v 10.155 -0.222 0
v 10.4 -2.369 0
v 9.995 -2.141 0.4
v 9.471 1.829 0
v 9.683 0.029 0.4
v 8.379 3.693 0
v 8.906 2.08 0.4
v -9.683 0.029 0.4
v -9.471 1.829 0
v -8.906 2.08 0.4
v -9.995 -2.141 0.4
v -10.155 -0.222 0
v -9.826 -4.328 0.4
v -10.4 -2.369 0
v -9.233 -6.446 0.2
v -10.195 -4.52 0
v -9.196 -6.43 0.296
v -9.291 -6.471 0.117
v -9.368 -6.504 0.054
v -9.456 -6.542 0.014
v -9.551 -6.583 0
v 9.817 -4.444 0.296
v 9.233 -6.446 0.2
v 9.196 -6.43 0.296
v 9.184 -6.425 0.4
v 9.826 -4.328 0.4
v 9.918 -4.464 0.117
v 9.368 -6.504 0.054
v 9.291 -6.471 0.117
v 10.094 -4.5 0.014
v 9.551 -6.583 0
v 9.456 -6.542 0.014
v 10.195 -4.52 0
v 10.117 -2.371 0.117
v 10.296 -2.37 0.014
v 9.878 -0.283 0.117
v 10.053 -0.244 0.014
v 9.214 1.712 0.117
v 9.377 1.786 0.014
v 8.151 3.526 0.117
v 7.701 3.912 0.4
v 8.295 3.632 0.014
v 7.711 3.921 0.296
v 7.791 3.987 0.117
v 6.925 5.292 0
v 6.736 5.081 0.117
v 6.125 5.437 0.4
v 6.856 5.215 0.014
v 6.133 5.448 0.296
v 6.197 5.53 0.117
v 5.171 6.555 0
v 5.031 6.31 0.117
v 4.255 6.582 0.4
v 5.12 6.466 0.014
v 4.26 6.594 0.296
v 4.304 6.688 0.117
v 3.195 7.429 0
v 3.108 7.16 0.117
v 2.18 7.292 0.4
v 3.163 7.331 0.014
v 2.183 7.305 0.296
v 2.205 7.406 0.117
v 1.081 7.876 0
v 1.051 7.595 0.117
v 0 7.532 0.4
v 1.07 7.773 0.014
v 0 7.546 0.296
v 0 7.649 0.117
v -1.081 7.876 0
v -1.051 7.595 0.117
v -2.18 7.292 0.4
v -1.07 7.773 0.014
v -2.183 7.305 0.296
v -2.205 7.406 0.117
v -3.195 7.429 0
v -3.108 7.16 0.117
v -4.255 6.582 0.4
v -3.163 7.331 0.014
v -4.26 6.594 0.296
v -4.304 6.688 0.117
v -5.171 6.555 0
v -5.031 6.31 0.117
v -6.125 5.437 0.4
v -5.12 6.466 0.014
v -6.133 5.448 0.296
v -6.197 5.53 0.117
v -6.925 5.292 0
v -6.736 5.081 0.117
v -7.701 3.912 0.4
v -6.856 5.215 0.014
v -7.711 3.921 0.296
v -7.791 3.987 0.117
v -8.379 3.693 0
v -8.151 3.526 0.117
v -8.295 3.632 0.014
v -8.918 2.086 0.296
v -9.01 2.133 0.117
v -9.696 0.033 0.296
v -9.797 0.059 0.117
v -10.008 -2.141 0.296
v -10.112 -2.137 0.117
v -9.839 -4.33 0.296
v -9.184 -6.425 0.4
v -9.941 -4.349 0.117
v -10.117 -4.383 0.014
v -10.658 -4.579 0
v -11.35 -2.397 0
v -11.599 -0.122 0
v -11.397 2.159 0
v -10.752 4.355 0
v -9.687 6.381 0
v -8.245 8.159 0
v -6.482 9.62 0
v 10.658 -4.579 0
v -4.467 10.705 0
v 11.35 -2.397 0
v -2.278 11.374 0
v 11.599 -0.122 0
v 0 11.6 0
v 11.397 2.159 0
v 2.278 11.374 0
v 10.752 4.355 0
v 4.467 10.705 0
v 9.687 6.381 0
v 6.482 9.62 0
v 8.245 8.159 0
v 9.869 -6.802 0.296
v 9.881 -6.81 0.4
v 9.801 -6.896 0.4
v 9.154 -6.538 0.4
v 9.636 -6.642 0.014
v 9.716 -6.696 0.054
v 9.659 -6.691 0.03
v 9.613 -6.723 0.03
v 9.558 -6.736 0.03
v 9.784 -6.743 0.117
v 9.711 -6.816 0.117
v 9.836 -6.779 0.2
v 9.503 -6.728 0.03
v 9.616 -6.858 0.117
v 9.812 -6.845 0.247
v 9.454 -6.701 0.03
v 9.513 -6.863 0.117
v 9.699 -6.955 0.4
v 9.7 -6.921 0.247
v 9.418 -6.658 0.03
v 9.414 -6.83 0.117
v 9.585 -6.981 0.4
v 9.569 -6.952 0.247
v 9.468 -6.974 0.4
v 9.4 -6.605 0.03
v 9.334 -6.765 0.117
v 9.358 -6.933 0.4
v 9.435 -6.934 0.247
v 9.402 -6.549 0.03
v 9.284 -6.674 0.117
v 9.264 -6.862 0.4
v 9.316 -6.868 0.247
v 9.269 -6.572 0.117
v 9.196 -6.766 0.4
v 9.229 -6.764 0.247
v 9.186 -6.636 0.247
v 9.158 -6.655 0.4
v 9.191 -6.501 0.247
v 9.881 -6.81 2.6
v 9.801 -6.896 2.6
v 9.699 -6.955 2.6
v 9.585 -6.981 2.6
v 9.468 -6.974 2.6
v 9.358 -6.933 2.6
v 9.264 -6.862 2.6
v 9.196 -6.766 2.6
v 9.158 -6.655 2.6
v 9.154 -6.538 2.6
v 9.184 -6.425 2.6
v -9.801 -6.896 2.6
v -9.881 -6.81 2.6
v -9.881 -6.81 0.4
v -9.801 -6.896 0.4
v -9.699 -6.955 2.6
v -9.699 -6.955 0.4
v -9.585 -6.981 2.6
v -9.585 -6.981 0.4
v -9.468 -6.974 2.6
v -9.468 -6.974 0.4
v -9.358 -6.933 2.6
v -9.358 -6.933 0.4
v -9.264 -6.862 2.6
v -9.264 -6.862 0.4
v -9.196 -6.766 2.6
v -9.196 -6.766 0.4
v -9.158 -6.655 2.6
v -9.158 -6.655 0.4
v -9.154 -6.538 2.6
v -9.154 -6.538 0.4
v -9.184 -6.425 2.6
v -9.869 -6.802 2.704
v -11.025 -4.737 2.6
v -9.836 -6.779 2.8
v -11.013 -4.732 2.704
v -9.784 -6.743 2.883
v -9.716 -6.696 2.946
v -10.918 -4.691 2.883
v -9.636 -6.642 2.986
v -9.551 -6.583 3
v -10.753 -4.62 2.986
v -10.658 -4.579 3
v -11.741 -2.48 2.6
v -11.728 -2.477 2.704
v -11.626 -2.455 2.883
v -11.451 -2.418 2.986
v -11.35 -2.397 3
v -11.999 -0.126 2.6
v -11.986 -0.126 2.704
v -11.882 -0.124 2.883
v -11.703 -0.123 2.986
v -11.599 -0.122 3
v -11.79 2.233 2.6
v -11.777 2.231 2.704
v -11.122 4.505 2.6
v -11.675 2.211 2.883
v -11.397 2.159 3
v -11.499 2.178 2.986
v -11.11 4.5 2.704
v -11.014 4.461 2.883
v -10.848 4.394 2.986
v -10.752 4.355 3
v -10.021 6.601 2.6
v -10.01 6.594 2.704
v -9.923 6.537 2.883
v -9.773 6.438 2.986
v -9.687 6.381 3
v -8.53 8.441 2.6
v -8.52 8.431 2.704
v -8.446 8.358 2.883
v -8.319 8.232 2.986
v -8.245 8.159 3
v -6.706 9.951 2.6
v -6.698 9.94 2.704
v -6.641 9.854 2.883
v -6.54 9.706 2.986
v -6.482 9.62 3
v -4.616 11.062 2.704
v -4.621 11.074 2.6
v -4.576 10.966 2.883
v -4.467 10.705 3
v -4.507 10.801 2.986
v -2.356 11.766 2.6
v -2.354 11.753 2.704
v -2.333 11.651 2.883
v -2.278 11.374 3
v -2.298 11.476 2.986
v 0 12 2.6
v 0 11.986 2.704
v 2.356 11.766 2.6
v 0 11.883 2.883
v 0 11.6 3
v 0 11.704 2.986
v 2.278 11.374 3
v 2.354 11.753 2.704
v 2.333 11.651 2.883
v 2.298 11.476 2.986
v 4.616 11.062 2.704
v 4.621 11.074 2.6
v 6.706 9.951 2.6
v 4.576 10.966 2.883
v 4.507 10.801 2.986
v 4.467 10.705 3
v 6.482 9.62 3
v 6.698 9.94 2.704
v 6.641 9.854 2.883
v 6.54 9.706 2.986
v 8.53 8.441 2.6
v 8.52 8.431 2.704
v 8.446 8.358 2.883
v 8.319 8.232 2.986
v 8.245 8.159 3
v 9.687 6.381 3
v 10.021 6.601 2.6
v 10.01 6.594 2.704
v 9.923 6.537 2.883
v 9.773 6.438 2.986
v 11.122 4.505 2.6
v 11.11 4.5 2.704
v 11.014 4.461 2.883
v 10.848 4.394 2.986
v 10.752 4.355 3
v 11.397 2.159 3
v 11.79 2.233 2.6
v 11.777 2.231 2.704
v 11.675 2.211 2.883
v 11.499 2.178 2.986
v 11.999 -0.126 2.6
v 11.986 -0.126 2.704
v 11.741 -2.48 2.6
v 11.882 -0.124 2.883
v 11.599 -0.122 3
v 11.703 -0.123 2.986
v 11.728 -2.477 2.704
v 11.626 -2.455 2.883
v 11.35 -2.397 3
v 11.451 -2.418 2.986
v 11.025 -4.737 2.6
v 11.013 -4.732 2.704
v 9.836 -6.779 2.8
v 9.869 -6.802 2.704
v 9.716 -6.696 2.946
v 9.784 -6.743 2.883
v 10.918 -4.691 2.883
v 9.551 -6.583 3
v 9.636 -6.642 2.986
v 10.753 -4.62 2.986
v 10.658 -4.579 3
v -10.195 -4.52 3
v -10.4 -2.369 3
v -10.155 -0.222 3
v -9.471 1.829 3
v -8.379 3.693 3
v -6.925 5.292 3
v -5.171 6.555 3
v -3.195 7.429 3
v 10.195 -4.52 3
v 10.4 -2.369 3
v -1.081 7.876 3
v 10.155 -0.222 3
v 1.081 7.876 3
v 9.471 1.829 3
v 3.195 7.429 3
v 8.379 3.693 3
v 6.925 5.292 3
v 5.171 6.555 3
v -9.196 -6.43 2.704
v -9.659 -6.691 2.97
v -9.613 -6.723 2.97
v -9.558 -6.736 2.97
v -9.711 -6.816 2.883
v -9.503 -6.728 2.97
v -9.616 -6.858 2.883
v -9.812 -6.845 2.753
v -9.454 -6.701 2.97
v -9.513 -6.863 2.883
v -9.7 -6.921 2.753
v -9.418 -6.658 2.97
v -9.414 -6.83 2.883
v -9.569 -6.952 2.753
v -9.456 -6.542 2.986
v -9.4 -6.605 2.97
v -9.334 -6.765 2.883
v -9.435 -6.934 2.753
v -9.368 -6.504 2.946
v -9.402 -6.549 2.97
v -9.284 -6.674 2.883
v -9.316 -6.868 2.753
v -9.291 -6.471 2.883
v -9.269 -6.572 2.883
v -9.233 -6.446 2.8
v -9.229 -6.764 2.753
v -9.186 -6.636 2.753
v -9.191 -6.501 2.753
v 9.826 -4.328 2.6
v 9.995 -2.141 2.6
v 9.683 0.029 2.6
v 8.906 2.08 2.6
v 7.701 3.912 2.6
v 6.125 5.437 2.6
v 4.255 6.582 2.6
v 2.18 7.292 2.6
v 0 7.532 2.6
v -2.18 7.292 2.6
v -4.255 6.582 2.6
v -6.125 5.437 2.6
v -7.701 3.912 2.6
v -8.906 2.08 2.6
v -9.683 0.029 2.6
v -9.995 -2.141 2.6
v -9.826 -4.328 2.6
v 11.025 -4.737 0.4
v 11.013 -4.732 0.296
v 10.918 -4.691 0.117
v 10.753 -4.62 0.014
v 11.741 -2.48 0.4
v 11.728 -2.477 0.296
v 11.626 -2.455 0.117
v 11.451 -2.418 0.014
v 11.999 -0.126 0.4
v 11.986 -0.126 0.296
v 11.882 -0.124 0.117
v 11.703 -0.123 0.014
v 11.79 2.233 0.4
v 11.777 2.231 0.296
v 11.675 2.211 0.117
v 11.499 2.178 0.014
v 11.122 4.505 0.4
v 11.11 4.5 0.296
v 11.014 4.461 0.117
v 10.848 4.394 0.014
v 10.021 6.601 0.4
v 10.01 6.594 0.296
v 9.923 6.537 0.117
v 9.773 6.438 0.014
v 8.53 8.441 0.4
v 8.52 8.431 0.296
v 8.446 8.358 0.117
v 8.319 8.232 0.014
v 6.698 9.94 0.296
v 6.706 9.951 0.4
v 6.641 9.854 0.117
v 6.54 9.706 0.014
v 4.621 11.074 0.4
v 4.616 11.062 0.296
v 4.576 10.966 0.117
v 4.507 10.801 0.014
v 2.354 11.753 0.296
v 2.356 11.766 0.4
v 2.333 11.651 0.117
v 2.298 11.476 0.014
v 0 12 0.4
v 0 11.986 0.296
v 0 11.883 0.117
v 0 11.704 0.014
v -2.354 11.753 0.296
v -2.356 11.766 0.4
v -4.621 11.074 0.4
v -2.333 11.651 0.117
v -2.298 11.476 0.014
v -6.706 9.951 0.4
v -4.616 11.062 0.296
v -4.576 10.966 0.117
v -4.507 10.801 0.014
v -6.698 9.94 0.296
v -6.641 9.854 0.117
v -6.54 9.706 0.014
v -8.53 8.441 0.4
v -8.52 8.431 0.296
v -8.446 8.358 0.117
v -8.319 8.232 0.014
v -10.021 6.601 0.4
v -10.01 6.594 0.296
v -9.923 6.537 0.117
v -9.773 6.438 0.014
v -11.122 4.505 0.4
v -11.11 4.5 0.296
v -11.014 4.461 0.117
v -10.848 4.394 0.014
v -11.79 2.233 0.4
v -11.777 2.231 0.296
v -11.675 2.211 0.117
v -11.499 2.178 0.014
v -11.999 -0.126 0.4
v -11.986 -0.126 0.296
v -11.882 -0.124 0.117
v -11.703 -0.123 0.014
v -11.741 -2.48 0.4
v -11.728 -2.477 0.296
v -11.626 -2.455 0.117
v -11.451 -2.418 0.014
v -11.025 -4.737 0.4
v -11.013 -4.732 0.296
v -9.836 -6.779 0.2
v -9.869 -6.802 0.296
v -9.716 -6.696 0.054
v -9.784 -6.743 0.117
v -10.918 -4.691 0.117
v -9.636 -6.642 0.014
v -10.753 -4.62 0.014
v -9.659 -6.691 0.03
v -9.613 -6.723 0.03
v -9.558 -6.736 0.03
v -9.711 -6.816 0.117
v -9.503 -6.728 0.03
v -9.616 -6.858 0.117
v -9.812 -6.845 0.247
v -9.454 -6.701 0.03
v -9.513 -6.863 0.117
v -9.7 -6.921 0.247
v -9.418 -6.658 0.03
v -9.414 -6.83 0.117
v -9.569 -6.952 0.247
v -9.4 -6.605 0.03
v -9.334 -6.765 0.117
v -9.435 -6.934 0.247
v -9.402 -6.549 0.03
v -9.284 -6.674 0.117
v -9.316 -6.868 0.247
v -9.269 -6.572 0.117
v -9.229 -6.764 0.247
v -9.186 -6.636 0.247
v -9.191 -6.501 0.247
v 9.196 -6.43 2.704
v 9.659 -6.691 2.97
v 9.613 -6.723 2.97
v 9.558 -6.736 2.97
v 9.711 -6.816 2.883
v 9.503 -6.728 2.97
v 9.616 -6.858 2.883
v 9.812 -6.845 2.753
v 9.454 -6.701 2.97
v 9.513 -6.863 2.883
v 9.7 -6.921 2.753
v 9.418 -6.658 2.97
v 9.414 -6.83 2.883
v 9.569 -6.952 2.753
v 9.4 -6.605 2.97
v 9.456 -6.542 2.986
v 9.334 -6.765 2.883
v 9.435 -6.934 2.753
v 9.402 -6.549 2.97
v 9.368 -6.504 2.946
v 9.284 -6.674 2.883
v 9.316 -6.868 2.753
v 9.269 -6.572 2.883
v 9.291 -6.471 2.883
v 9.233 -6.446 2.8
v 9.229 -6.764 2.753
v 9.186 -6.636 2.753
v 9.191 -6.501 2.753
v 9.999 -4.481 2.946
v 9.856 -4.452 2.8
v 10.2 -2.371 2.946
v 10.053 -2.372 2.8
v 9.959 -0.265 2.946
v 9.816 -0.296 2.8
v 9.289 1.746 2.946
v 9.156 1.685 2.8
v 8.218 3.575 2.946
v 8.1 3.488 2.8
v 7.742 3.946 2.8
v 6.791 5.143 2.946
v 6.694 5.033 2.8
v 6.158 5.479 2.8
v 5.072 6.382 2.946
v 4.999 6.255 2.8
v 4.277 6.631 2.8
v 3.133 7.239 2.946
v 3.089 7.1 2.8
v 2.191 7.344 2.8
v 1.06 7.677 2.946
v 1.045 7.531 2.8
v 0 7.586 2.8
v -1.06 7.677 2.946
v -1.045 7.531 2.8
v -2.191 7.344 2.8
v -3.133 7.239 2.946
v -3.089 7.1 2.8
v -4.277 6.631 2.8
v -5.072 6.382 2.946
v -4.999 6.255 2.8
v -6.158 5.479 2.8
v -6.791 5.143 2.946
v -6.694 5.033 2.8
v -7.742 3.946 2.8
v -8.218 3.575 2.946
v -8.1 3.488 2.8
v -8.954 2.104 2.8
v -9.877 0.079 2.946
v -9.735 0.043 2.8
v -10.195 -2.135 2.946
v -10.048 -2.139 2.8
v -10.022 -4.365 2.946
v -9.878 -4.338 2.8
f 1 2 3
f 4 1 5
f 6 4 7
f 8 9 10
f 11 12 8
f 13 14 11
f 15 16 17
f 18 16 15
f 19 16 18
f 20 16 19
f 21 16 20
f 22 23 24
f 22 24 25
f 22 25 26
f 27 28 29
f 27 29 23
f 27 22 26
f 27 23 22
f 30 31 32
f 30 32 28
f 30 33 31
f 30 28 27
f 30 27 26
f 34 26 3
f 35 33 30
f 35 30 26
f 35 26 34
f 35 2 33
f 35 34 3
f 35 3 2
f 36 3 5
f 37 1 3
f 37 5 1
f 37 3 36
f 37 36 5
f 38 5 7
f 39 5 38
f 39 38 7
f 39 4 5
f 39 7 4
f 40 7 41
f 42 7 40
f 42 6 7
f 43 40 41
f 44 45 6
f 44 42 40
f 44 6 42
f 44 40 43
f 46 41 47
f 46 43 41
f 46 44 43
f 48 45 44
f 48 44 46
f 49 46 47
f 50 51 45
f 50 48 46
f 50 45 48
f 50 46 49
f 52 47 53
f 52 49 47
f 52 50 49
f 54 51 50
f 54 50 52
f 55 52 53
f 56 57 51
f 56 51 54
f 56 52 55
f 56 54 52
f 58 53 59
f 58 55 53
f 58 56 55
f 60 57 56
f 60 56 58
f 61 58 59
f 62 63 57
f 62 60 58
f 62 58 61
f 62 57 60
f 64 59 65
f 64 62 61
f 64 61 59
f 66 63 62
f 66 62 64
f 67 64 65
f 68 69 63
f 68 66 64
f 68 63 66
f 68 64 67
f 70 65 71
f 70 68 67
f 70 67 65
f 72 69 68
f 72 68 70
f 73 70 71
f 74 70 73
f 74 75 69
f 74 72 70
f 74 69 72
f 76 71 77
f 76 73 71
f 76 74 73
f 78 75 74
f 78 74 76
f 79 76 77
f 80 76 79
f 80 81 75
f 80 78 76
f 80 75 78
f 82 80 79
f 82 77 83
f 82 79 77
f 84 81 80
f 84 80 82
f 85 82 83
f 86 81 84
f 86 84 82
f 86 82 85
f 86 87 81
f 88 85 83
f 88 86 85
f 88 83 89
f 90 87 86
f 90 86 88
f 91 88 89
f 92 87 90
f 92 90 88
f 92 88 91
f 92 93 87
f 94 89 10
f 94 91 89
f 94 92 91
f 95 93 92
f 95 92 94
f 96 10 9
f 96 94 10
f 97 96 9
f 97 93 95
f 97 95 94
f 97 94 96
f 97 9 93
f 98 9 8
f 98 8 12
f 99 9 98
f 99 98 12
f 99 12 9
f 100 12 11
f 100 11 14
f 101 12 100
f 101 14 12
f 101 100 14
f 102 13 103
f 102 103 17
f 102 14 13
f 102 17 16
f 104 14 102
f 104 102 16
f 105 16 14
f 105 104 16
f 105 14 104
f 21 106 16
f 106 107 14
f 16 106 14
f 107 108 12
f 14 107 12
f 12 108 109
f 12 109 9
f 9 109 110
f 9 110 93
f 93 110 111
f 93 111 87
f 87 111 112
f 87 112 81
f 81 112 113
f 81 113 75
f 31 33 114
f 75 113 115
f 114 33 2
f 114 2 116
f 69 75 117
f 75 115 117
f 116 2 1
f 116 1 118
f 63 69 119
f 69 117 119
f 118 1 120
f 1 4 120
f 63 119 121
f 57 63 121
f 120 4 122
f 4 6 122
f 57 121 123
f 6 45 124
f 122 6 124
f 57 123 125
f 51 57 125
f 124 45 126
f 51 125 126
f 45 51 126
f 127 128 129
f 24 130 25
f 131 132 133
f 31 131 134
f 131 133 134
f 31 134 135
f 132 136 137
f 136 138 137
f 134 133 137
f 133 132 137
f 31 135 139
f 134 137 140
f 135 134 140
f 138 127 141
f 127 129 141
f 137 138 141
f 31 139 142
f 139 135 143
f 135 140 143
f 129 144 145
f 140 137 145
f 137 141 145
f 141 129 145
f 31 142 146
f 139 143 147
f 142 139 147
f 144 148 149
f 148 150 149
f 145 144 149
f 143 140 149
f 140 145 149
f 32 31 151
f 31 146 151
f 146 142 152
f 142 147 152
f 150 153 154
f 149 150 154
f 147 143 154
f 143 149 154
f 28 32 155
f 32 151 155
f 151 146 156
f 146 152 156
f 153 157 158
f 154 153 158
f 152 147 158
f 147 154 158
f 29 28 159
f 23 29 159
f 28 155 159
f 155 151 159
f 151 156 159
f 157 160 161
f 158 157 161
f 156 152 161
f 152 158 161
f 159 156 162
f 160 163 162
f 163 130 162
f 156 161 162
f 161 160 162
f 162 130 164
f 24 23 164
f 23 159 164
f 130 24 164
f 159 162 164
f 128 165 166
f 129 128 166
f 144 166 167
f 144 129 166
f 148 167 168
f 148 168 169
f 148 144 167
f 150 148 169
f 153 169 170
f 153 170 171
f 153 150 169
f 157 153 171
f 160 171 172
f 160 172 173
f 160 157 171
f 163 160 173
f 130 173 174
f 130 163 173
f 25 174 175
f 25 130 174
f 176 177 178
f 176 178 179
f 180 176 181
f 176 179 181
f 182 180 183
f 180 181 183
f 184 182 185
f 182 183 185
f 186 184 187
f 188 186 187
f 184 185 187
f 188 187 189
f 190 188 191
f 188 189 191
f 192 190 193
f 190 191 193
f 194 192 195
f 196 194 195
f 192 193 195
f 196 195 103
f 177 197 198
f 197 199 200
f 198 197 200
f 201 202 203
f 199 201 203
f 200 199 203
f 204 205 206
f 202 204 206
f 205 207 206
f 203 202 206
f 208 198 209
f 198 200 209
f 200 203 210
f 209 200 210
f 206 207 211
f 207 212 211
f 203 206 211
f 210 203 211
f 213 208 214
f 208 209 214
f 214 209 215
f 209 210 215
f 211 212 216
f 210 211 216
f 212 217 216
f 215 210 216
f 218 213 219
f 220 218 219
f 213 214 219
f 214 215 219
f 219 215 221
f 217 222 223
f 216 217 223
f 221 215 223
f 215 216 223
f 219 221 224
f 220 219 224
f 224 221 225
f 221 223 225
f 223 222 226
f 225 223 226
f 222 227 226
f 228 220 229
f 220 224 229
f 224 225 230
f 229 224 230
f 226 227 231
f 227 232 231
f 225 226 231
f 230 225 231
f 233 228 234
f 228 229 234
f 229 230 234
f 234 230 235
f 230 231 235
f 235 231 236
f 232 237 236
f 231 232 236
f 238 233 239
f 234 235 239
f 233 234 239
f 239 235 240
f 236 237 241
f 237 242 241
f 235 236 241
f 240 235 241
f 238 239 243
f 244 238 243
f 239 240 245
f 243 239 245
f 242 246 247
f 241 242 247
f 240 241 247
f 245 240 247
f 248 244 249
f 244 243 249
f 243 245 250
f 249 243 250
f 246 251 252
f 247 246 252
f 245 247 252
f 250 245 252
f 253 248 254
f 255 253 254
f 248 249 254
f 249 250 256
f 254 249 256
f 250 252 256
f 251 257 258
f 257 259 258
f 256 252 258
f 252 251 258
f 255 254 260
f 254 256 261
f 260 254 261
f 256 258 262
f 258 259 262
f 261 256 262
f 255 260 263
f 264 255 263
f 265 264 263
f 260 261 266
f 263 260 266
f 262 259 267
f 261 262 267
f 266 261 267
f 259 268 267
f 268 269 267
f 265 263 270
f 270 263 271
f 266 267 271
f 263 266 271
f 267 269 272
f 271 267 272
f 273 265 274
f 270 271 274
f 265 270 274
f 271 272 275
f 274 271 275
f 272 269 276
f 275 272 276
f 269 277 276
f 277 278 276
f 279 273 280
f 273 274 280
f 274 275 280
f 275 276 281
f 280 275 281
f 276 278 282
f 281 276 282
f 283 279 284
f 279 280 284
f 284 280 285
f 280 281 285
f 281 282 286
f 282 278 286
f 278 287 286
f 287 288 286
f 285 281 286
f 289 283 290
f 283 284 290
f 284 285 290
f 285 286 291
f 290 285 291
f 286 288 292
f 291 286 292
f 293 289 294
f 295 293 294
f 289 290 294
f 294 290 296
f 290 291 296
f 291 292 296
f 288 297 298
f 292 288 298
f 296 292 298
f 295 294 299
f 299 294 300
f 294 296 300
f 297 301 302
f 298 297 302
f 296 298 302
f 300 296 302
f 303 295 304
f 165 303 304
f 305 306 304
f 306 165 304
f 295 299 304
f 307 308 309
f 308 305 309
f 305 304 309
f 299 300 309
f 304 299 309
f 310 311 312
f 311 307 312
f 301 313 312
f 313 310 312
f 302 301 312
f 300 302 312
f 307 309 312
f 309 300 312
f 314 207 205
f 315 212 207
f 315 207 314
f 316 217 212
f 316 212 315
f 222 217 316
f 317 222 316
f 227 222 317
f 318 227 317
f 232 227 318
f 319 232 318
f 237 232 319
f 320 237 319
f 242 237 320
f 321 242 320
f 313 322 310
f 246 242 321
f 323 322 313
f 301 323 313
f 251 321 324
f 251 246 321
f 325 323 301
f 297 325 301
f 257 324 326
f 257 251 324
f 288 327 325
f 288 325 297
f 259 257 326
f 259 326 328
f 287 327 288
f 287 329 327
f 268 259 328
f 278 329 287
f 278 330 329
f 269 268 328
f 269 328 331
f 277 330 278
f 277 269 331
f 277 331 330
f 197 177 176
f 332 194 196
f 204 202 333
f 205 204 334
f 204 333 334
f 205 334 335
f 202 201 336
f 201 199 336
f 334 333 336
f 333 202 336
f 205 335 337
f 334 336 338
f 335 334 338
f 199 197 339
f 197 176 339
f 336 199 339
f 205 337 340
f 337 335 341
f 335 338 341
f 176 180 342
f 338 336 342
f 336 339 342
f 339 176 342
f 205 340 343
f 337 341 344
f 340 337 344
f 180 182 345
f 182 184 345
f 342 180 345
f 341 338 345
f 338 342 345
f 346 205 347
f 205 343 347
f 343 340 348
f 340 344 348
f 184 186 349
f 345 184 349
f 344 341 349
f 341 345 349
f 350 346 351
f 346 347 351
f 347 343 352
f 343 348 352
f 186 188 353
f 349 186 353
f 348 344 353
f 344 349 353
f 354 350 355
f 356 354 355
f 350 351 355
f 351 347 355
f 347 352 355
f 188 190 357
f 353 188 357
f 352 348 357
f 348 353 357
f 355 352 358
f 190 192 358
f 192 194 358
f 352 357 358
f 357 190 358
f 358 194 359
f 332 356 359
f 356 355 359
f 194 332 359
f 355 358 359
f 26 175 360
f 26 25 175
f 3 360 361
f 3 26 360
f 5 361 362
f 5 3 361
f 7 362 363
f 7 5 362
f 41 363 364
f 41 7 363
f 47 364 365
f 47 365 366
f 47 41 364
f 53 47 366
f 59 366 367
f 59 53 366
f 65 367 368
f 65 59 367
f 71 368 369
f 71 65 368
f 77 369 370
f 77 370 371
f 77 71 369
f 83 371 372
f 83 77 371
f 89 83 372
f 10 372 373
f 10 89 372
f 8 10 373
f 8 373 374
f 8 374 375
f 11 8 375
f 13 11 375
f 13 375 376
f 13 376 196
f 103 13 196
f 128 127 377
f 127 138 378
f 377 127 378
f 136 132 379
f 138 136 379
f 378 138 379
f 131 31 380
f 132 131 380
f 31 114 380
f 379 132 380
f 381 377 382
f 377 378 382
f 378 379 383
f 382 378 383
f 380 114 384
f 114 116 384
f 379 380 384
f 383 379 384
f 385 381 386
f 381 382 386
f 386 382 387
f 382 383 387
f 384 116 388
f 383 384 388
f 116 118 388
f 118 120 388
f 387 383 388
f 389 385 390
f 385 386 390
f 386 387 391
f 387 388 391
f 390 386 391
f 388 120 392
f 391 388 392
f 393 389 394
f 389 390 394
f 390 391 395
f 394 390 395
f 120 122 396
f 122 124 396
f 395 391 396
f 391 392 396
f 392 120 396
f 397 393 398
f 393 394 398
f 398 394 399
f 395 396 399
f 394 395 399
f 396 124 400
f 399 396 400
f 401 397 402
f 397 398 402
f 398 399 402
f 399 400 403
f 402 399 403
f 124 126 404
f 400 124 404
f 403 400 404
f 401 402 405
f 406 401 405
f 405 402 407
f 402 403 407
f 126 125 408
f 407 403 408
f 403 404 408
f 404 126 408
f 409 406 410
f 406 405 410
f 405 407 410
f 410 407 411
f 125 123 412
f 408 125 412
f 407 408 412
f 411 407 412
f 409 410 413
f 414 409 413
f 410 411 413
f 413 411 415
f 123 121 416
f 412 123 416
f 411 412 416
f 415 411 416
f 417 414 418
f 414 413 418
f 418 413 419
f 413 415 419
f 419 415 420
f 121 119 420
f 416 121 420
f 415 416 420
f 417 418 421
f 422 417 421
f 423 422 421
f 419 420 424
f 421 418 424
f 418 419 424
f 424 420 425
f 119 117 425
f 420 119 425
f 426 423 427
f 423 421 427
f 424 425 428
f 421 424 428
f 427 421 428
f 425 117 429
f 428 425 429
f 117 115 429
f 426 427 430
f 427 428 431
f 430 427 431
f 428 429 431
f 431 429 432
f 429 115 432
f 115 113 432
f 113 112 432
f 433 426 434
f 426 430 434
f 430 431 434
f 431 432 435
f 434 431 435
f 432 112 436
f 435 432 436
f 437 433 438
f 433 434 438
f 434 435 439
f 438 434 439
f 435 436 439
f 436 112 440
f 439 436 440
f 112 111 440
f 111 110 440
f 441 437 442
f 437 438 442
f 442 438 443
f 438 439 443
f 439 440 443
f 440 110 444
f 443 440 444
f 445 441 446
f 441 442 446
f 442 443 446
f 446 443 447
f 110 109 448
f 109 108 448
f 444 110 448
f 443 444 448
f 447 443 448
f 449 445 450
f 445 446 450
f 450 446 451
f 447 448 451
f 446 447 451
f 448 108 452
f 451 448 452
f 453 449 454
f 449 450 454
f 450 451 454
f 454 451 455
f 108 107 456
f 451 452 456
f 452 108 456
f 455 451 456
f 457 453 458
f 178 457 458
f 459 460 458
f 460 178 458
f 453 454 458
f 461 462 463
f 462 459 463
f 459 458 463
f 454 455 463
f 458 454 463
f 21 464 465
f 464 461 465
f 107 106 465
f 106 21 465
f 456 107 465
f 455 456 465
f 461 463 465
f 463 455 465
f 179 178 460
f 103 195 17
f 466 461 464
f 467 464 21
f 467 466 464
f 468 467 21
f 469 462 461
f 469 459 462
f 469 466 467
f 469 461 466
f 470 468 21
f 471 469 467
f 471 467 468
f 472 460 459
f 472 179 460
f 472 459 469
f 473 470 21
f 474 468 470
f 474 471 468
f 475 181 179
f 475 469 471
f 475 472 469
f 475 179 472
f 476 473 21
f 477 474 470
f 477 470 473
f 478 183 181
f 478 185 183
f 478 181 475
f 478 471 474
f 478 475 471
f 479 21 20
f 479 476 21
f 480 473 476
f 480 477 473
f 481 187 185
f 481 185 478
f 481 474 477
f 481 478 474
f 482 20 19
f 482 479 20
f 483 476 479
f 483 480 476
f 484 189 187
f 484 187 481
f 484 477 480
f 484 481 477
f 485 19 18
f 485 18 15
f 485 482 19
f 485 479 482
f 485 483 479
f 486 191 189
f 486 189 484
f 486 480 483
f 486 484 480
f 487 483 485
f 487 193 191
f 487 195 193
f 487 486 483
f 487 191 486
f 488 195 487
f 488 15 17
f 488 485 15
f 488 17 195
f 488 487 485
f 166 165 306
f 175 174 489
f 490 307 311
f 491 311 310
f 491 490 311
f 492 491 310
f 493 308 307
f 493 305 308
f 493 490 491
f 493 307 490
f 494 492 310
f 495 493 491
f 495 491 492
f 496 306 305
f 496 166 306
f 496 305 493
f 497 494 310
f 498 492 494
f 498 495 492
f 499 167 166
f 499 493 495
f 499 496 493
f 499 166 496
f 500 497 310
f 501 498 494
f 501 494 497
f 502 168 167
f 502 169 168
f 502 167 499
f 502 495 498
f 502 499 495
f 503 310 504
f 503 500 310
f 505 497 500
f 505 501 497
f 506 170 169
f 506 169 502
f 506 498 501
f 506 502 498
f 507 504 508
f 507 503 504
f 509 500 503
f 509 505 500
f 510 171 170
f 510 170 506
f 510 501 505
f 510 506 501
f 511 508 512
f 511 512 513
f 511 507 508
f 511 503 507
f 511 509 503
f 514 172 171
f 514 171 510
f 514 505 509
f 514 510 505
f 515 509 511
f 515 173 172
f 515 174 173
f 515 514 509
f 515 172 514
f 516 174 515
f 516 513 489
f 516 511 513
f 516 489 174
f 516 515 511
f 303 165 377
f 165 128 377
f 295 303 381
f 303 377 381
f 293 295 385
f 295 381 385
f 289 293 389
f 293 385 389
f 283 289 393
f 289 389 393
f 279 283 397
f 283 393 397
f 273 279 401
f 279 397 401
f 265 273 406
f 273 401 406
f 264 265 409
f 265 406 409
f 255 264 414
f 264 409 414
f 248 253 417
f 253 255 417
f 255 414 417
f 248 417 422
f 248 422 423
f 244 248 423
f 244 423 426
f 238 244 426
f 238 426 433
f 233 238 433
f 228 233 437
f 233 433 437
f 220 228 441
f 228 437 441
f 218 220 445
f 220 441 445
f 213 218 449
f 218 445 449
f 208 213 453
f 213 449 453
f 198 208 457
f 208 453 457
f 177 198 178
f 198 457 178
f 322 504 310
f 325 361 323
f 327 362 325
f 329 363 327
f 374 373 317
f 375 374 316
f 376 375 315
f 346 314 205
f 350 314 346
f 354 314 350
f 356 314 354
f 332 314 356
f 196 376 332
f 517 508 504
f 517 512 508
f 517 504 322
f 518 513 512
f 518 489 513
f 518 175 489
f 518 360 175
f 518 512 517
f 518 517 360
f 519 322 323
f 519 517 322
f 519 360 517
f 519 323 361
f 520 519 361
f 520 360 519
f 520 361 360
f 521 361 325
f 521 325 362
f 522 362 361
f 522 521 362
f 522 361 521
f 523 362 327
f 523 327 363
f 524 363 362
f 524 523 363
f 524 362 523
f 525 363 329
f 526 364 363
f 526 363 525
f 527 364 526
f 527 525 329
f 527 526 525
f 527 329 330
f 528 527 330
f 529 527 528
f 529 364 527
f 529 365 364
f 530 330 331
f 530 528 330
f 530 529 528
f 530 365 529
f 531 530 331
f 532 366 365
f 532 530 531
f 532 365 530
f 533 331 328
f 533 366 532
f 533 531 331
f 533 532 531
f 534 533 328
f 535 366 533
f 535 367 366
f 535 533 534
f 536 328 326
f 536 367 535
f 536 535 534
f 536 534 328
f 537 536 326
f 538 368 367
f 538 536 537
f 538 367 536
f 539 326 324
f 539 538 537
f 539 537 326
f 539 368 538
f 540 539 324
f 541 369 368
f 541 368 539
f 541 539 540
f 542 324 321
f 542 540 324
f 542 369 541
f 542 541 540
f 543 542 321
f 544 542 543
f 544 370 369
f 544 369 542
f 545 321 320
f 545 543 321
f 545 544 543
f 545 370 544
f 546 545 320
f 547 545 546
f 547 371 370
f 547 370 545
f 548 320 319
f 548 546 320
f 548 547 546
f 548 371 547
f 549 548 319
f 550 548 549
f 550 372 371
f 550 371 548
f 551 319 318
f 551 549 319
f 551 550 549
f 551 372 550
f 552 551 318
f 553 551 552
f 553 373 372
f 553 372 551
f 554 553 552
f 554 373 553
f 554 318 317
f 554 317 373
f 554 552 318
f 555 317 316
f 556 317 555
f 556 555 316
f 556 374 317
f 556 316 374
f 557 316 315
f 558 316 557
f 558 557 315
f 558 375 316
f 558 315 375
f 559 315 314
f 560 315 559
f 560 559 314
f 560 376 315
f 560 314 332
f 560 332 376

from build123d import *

# Parameters (mm, degrees)
SKETCH_R     = 12
PAD_DEPTH    = 3
SKETCH001_R  = 10
POCKET_DEPTH = 3.001
FILLET_R     = 0.4


with BuildPart() as part:
    # Sketch → Pad (new body)
    with BuildSketch(Plane.XY):
        Circle(SKETCH_R)
    extrude(amount=PAD_DEPTH)

    # Sketch001 → Pocket (cut, through all)
    with BuildSketch(Plane.XY):
        with Locations((0, -2.467762)):
            Circle(SKETCH001_R)
    extrude(amount=POCKET_DEPTH, mode=Mode.SUBTRACT)

    # Fillet
    fillet_edges = [part.edges().sort_by_distance(p)[0] for p in [
        (-5.794891, 10.508056, 3),
        (-4.240751, 6.588508, 3),
        (-5.794891, 10.508056, 0),
        (-4.240751, 6.588508, 0),
        (9.05627, -6.708513, 0),
        (10.508056, -5.794891, 0),
        (6.403207, -10.14884, 1.5),
        (-6.403207, -10.14884, 1.5),
    ]]
    fillet(fillet_edges, radius=FILLET_R)


solid = part.part
